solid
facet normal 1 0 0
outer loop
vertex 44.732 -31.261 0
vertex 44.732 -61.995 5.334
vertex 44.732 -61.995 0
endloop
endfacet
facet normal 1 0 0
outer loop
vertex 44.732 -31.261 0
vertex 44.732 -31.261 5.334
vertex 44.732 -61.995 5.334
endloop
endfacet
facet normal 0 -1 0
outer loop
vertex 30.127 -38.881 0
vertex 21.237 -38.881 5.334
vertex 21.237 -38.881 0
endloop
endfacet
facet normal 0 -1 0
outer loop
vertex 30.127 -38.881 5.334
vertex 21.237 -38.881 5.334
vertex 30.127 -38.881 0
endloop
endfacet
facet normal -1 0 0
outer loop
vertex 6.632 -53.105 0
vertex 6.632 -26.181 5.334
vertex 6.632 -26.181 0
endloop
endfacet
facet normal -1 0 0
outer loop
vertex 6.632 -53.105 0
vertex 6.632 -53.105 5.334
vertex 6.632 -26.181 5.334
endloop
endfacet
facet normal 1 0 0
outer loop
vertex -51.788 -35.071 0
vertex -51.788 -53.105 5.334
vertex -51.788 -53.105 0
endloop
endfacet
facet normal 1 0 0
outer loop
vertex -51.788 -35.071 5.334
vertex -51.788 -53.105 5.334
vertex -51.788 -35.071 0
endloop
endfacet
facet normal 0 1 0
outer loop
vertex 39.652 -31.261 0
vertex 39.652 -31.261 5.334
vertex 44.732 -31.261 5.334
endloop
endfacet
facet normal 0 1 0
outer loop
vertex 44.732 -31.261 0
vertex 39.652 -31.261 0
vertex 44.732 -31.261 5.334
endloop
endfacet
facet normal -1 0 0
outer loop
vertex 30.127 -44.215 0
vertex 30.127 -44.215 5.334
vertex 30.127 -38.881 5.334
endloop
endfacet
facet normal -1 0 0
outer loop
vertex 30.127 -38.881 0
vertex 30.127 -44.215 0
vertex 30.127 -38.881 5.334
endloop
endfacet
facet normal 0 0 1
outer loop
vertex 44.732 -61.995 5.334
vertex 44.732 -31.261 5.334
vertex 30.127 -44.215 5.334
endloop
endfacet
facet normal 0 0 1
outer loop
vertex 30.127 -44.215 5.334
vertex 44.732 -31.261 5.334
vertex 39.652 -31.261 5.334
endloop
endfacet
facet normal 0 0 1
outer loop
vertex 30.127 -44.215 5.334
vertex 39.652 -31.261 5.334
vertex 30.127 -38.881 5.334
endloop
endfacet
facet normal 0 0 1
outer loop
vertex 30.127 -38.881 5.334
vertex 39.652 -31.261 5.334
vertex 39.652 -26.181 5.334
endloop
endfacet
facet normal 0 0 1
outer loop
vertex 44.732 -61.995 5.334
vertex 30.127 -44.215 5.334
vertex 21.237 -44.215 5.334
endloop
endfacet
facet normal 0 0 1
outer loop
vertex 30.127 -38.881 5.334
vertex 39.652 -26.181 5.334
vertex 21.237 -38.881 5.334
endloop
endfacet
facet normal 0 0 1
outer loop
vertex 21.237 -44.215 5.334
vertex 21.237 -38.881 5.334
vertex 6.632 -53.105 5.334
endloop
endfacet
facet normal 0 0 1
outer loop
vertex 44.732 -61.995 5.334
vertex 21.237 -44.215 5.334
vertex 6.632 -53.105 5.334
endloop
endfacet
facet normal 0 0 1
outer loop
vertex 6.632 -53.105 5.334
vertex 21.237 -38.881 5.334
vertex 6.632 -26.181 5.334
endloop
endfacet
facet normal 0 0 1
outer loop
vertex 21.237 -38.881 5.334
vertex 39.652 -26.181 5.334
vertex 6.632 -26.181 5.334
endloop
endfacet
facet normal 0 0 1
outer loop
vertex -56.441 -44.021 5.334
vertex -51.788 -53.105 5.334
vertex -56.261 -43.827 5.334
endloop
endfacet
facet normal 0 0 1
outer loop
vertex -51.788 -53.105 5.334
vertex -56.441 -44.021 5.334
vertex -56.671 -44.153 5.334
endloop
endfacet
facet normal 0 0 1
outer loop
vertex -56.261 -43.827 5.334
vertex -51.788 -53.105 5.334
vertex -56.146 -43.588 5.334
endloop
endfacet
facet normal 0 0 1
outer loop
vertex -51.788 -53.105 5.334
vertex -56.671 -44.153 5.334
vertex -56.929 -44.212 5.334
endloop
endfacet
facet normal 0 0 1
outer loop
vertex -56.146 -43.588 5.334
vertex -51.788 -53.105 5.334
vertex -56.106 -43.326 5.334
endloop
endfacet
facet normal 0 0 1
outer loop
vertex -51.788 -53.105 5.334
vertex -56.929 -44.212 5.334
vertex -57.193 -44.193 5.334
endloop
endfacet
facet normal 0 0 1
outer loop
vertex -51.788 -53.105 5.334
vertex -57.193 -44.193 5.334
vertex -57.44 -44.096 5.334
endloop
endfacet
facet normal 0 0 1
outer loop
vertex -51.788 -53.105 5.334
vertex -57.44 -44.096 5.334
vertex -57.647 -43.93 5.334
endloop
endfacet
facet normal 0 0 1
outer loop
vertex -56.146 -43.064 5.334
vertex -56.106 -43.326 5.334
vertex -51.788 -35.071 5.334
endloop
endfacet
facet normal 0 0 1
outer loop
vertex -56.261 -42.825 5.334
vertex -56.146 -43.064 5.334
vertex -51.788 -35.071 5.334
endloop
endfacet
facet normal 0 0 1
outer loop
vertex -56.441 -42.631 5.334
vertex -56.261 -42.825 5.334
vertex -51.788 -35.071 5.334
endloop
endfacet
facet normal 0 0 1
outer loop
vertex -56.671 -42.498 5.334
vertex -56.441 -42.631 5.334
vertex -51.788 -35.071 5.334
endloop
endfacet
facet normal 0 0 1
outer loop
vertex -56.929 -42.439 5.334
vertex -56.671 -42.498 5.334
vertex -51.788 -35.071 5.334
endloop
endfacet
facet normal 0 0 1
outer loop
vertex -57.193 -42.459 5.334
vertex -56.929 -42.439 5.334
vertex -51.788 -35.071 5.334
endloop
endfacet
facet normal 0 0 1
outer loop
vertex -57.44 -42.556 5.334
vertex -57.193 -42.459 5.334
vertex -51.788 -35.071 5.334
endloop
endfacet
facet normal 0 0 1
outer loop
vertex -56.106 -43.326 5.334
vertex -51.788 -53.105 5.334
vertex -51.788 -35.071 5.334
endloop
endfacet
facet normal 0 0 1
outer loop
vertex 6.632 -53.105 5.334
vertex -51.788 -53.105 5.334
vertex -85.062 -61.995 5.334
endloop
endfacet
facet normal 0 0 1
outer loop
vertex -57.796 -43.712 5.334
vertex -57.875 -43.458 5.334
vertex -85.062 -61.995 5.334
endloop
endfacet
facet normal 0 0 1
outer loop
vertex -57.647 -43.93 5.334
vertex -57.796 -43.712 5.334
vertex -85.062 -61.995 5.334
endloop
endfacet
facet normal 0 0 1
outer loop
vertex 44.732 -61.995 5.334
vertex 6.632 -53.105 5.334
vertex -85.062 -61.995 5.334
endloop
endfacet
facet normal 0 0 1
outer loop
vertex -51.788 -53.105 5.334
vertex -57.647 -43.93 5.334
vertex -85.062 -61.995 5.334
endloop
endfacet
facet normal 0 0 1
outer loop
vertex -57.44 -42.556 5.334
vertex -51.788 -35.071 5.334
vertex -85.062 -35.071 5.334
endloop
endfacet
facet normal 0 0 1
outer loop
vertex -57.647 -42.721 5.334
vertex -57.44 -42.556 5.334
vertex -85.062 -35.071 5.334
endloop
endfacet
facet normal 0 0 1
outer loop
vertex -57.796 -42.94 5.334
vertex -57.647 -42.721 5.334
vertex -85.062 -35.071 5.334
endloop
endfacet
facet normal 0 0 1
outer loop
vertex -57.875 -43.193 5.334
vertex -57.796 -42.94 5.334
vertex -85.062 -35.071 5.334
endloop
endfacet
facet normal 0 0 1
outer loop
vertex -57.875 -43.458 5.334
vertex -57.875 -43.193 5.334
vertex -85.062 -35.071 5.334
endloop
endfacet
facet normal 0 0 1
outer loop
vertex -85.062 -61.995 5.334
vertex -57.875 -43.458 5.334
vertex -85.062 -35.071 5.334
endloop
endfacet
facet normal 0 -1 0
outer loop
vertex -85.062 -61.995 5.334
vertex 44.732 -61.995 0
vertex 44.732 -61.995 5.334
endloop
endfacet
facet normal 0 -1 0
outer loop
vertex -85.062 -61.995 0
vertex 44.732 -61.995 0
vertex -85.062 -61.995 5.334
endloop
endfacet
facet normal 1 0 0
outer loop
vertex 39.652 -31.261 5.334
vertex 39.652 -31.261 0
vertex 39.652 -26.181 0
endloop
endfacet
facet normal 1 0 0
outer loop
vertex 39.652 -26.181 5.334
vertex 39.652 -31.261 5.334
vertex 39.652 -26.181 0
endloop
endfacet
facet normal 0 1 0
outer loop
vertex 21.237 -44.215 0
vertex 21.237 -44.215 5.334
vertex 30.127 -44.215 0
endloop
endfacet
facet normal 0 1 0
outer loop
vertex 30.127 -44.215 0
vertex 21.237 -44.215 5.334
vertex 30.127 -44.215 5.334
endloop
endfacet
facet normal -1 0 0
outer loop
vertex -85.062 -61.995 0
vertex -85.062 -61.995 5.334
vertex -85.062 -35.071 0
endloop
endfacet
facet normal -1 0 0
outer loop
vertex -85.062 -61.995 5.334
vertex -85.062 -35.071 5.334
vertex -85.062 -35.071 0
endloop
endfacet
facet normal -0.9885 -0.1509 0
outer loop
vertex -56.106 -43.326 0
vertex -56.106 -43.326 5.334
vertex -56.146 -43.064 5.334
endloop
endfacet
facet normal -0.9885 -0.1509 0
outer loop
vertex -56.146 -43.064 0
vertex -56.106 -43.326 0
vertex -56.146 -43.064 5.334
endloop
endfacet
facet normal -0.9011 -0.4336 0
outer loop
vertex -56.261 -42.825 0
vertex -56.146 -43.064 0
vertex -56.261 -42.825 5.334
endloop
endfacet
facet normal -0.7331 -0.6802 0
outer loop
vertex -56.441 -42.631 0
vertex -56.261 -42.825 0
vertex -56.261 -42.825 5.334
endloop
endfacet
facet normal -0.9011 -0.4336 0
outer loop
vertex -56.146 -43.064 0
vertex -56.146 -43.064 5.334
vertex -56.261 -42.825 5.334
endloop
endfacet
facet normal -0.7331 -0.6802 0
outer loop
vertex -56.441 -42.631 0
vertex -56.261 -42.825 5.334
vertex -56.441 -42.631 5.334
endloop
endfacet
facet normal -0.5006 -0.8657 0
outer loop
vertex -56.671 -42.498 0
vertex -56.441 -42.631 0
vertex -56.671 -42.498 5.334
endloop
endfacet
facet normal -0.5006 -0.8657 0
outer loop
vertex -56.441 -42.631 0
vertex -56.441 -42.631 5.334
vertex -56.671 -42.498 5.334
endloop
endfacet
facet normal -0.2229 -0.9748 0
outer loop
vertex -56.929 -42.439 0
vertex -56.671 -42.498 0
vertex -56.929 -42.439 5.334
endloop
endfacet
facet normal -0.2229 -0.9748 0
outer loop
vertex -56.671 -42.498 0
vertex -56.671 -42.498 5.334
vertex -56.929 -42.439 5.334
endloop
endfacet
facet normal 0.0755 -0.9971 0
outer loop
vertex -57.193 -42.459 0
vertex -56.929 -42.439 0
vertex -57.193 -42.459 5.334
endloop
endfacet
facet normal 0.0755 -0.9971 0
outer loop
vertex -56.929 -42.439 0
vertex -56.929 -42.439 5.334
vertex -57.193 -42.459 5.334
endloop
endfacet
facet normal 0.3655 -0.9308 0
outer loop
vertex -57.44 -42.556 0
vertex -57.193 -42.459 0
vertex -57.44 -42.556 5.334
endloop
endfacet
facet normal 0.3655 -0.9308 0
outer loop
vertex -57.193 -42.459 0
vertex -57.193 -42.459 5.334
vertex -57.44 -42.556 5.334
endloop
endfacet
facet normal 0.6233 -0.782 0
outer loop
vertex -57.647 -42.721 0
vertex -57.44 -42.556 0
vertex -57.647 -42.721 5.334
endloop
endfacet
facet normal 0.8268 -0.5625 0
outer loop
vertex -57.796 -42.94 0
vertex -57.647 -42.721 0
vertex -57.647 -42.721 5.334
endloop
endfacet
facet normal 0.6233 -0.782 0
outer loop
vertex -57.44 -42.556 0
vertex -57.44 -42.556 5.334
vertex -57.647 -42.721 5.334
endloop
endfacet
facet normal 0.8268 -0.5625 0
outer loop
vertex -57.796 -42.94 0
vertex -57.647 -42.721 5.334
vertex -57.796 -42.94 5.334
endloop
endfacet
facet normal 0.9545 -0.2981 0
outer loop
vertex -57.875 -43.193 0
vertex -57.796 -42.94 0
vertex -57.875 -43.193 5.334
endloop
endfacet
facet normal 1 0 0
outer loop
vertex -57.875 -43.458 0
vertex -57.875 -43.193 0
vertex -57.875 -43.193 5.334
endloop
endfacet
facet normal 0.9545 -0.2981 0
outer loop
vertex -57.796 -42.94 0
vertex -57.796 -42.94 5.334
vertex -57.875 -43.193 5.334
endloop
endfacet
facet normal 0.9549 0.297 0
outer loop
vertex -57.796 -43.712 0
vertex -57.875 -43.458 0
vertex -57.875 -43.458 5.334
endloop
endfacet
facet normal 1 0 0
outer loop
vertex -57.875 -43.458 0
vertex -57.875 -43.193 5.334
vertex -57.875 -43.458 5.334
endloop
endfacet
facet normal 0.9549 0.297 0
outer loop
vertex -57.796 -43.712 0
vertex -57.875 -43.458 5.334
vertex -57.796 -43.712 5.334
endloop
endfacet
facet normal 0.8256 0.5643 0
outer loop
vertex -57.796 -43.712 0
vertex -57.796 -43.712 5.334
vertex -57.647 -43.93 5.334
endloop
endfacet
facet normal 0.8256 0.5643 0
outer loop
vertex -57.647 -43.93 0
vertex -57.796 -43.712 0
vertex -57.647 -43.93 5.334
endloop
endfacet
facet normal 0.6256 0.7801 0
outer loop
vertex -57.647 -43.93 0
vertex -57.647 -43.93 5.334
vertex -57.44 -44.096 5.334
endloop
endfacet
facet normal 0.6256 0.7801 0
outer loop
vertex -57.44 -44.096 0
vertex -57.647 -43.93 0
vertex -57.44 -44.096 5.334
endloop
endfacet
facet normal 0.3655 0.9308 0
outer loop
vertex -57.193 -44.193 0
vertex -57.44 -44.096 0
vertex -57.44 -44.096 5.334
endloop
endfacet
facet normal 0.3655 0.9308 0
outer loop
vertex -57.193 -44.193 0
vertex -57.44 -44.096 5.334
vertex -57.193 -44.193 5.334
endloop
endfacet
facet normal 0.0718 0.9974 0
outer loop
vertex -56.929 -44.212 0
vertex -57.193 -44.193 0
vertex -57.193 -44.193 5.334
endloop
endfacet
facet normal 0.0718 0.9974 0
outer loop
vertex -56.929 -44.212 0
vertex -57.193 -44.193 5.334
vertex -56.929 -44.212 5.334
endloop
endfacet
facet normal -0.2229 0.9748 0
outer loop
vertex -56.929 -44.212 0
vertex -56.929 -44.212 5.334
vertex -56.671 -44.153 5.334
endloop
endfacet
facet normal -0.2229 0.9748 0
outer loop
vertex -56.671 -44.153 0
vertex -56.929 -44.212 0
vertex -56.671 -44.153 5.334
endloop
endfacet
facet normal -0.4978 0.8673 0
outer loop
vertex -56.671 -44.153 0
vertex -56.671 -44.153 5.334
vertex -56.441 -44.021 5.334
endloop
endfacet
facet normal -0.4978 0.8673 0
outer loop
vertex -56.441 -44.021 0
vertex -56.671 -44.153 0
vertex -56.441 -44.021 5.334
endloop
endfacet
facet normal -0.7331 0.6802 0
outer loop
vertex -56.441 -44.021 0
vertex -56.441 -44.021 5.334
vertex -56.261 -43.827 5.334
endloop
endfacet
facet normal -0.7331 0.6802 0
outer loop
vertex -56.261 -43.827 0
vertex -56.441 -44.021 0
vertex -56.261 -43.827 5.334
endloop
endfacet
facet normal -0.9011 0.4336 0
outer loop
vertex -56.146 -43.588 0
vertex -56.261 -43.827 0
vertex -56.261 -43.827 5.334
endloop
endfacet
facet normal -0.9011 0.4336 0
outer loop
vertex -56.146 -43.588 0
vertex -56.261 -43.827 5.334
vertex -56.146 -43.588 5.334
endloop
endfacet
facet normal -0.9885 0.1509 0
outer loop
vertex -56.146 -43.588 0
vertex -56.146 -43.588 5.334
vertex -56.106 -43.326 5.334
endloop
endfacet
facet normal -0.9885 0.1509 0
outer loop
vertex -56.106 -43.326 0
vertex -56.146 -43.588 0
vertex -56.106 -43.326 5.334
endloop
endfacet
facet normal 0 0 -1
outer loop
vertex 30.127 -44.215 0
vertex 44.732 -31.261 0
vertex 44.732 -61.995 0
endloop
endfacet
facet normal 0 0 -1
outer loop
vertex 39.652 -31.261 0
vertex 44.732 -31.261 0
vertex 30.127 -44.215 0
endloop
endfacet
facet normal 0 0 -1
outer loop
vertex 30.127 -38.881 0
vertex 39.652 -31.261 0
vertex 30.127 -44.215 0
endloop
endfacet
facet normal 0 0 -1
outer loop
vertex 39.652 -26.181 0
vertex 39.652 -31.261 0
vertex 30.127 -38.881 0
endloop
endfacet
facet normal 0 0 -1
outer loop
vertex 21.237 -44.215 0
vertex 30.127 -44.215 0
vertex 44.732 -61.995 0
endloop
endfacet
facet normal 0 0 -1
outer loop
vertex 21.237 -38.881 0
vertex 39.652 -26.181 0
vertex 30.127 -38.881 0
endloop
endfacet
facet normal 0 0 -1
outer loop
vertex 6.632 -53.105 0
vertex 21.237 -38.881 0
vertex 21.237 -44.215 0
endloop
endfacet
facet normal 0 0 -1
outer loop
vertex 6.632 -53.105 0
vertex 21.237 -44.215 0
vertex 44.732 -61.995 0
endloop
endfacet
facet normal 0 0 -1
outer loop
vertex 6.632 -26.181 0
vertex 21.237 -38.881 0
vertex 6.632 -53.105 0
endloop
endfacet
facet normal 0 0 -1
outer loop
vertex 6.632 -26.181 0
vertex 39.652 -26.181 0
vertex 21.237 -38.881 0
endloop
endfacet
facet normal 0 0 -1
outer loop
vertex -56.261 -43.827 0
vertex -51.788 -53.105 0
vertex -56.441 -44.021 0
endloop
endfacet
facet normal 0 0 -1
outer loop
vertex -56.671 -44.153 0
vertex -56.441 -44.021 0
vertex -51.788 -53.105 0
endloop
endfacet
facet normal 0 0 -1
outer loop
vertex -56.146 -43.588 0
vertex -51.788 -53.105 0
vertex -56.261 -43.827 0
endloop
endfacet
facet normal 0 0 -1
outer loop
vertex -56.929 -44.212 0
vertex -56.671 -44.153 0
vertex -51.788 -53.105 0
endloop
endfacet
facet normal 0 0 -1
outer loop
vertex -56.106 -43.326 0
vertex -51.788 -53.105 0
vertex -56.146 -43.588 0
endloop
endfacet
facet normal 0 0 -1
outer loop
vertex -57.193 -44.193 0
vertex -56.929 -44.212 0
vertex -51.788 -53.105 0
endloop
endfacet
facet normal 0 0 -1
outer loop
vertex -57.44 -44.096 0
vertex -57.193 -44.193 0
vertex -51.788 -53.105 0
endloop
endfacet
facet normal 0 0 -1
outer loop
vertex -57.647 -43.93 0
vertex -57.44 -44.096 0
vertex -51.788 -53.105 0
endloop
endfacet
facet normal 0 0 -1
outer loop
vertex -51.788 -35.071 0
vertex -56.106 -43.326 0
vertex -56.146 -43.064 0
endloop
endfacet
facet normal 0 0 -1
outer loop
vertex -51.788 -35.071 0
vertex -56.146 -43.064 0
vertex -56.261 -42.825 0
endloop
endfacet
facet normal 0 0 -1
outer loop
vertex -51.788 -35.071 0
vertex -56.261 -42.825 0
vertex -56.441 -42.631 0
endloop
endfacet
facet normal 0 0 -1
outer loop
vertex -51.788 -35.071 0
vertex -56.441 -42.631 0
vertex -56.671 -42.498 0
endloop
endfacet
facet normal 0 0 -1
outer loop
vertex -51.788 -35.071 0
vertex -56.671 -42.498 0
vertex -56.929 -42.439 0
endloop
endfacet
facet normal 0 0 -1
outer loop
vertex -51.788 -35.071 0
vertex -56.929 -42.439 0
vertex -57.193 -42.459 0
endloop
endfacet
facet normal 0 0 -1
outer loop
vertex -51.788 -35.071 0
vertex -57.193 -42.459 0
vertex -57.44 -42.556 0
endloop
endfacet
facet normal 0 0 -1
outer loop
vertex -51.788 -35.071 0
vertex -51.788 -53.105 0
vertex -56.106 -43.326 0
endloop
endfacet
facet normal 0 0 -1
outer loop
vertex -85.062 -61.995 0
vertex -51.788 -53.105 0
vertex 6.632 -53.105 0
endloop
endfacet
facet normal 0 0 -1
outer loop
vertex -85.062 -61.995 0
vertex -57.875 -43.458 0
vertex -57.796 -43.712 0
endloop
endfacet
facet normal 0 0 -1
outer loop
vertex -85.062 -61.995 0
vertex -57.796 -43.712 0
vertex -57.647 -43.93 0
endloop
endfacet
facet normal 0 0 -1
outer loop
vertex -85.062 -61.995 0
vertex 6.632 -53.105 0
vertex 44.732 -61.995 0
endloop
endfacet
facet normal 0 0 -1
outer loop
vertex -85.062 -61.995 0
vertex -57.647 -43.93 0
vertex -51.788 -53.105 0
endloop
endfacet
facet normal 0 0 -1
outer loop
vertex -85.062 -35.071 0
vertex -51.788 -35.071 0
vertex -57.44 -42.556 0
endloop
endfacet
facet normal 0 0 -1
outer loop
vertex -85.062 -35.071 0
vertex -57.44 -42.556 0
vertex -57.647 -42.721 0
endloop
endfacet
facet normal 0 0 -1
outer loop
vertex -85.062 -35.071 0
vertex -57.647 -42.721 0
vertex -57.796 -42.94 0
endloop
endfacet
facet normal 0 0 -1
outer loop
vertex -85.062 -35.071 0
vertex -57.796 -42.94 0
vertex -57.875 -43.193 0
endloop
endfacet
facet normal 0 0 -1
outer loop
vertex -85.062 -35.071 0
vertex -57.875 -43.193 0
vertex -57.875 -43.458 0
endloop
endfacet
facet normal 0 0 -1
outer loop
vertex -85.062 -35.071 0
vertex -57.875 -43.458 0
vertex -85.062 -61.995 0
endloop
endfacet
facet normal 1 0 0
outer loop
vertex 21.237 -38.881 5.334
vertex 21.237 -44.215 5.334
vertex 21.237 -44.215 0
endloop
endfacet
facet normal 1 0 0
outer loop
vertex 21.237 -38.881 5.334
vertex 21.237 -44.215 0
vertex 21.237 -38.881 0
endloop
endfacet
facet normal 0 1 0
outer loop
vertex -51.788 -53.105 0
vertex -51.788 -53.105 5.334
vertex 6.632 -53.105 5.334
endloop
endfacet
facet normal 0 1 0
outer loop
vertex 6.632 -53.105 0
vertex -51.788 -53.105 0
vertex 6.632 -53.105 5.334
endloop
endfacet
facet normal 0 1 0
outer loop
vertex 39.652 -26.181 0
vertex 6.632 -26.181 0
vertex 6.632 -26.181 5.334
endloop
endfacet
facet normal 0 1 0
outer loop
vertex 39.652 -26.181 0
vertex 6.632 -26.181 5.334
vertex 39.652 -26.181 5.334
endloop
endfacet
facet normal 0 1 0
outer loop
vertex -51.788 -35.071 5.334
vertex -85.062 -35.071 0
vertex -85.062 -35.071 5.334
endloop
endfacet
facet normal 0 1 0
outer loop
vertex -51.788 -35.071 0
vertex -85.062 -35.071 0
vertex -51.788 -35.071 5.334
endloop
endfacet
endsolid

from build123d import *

# Parameters (mm, degrees)
SKETCH1_W           = 129.794
SKETCH1_H           = 24.384
BOSS_EXTRUDE1_DEPTH = 5.334
SKETCH3_W           = 58.42
SKETCH3_H           = 18.034
CUT_EXTRUDE1_DEPTH  = 104.917980915
SKETCH6_W           = 38.1
SKETCH6_H           = 5.334
BOSS_EXTRUDE2_DEPTH = 8.89
SKETCH7_W           = 5.08
SKETCH7_H           = 5.08
CUT_EXTRUDE4_DEPTH  = 104.917980915
SKETCH8_W           = 8.89
SKETCH8_H           = 5.334
CUT_EXTRUDE5_DEPTH  = 104.917980915
SKETCH4_R           = 0.889
CUT_EXTRUDE6_DEPTH  = 104.917980915
SKETCH9_W           = 129.794
SKETCH9_H           = 5.334
BOSS_EXTRUDE3_DEPTH = 2.54


with BuildPart() as part:
    # Sketch1 → Boss-Extrude1 (new body)
    with BuildSketch(Plane.XY):
        with Locations((-20.165445418, -47.262819662)):
            Rectangle(SKETCH1_W, SKETCH1_H)
    extrude(amount=BOSS_EXTRUDE1_DEPTH)

    # Sketch3 → Cut-Extrude1 (cut, through all)
    with BuildSketch(Plane.XY.offset(5.334)):
        with Locations((-22.578445418, -44.087819662)):
            Rectangle(SKETCH3_W, SKETCH3_H)
    extrude(amount=-CUT_EXTRUDE1_DEPTH, mode=Mode.SUBTRACT)

    # Sketch6 → Boss-Extrude2 (add)
    with BuildSketch(Plane(origin=(0, -35.070819662, 0), x_dir=(1, 0, 0), z_dir=(0, 1, 0))):
        with Locations((25.681554582, -2.667)):
            Rectangle(SKETCH6_W, SKETCH6_H)
    extrude(amount=BOSS_EXTRUDE2_DEPTH)

    # Sketch7 → Cut-Extrude4 (cut, through all)
    with BuildSketch(Plane.XY.offset(5.334)):
        with Locations((42.191554582, -28.720819662)):
            Rectangle(SKETCH7_W, SKETCH7_H)
    extrude(amount=-CUT_EXTRUDE4_DEPTH, mode=Mode.SUBTRACT)

    # Sketch8 → Cut-Extrude5 (cut, through all)
    with BuildSketch(Plane.XY.offset(5.334)):
        with Locations((25.681554582, -41.547819662)):
            Rectangle(SKETCH8_W, SKETCH8_H)
    extrude(amount=-CUT_EXTRUDE5_DEPTH, mode=Mode.SUBTRACT)

    # Sketch4 → Cut-Extrude6 (cut, through all)
    with BuildSketch(Plane.XY.offset(5.334)):
        with Locations((-56.995445418, -43.325819662)):
            Circle(SKETCH4_R)
    extrude(amount=-CUT_EXTRUDE6_DEPTH, mode=Mode.SUBTRACT)

    # Sketch9 → Boss-Extrude3 (add)
    with BuildSketch(Plane(origin=(0, -59.454819662, 0), x_dir=(-1, 0, 0), z_dir=(0, -1, 0))):
        with Locations((20.165445418, -2.667)):
            Rectangle(SKETCH9_W, SKETCH9_H)
    extrude(amount=BOSS_EXTRUDE3_DEPTH)


solid = part.part
